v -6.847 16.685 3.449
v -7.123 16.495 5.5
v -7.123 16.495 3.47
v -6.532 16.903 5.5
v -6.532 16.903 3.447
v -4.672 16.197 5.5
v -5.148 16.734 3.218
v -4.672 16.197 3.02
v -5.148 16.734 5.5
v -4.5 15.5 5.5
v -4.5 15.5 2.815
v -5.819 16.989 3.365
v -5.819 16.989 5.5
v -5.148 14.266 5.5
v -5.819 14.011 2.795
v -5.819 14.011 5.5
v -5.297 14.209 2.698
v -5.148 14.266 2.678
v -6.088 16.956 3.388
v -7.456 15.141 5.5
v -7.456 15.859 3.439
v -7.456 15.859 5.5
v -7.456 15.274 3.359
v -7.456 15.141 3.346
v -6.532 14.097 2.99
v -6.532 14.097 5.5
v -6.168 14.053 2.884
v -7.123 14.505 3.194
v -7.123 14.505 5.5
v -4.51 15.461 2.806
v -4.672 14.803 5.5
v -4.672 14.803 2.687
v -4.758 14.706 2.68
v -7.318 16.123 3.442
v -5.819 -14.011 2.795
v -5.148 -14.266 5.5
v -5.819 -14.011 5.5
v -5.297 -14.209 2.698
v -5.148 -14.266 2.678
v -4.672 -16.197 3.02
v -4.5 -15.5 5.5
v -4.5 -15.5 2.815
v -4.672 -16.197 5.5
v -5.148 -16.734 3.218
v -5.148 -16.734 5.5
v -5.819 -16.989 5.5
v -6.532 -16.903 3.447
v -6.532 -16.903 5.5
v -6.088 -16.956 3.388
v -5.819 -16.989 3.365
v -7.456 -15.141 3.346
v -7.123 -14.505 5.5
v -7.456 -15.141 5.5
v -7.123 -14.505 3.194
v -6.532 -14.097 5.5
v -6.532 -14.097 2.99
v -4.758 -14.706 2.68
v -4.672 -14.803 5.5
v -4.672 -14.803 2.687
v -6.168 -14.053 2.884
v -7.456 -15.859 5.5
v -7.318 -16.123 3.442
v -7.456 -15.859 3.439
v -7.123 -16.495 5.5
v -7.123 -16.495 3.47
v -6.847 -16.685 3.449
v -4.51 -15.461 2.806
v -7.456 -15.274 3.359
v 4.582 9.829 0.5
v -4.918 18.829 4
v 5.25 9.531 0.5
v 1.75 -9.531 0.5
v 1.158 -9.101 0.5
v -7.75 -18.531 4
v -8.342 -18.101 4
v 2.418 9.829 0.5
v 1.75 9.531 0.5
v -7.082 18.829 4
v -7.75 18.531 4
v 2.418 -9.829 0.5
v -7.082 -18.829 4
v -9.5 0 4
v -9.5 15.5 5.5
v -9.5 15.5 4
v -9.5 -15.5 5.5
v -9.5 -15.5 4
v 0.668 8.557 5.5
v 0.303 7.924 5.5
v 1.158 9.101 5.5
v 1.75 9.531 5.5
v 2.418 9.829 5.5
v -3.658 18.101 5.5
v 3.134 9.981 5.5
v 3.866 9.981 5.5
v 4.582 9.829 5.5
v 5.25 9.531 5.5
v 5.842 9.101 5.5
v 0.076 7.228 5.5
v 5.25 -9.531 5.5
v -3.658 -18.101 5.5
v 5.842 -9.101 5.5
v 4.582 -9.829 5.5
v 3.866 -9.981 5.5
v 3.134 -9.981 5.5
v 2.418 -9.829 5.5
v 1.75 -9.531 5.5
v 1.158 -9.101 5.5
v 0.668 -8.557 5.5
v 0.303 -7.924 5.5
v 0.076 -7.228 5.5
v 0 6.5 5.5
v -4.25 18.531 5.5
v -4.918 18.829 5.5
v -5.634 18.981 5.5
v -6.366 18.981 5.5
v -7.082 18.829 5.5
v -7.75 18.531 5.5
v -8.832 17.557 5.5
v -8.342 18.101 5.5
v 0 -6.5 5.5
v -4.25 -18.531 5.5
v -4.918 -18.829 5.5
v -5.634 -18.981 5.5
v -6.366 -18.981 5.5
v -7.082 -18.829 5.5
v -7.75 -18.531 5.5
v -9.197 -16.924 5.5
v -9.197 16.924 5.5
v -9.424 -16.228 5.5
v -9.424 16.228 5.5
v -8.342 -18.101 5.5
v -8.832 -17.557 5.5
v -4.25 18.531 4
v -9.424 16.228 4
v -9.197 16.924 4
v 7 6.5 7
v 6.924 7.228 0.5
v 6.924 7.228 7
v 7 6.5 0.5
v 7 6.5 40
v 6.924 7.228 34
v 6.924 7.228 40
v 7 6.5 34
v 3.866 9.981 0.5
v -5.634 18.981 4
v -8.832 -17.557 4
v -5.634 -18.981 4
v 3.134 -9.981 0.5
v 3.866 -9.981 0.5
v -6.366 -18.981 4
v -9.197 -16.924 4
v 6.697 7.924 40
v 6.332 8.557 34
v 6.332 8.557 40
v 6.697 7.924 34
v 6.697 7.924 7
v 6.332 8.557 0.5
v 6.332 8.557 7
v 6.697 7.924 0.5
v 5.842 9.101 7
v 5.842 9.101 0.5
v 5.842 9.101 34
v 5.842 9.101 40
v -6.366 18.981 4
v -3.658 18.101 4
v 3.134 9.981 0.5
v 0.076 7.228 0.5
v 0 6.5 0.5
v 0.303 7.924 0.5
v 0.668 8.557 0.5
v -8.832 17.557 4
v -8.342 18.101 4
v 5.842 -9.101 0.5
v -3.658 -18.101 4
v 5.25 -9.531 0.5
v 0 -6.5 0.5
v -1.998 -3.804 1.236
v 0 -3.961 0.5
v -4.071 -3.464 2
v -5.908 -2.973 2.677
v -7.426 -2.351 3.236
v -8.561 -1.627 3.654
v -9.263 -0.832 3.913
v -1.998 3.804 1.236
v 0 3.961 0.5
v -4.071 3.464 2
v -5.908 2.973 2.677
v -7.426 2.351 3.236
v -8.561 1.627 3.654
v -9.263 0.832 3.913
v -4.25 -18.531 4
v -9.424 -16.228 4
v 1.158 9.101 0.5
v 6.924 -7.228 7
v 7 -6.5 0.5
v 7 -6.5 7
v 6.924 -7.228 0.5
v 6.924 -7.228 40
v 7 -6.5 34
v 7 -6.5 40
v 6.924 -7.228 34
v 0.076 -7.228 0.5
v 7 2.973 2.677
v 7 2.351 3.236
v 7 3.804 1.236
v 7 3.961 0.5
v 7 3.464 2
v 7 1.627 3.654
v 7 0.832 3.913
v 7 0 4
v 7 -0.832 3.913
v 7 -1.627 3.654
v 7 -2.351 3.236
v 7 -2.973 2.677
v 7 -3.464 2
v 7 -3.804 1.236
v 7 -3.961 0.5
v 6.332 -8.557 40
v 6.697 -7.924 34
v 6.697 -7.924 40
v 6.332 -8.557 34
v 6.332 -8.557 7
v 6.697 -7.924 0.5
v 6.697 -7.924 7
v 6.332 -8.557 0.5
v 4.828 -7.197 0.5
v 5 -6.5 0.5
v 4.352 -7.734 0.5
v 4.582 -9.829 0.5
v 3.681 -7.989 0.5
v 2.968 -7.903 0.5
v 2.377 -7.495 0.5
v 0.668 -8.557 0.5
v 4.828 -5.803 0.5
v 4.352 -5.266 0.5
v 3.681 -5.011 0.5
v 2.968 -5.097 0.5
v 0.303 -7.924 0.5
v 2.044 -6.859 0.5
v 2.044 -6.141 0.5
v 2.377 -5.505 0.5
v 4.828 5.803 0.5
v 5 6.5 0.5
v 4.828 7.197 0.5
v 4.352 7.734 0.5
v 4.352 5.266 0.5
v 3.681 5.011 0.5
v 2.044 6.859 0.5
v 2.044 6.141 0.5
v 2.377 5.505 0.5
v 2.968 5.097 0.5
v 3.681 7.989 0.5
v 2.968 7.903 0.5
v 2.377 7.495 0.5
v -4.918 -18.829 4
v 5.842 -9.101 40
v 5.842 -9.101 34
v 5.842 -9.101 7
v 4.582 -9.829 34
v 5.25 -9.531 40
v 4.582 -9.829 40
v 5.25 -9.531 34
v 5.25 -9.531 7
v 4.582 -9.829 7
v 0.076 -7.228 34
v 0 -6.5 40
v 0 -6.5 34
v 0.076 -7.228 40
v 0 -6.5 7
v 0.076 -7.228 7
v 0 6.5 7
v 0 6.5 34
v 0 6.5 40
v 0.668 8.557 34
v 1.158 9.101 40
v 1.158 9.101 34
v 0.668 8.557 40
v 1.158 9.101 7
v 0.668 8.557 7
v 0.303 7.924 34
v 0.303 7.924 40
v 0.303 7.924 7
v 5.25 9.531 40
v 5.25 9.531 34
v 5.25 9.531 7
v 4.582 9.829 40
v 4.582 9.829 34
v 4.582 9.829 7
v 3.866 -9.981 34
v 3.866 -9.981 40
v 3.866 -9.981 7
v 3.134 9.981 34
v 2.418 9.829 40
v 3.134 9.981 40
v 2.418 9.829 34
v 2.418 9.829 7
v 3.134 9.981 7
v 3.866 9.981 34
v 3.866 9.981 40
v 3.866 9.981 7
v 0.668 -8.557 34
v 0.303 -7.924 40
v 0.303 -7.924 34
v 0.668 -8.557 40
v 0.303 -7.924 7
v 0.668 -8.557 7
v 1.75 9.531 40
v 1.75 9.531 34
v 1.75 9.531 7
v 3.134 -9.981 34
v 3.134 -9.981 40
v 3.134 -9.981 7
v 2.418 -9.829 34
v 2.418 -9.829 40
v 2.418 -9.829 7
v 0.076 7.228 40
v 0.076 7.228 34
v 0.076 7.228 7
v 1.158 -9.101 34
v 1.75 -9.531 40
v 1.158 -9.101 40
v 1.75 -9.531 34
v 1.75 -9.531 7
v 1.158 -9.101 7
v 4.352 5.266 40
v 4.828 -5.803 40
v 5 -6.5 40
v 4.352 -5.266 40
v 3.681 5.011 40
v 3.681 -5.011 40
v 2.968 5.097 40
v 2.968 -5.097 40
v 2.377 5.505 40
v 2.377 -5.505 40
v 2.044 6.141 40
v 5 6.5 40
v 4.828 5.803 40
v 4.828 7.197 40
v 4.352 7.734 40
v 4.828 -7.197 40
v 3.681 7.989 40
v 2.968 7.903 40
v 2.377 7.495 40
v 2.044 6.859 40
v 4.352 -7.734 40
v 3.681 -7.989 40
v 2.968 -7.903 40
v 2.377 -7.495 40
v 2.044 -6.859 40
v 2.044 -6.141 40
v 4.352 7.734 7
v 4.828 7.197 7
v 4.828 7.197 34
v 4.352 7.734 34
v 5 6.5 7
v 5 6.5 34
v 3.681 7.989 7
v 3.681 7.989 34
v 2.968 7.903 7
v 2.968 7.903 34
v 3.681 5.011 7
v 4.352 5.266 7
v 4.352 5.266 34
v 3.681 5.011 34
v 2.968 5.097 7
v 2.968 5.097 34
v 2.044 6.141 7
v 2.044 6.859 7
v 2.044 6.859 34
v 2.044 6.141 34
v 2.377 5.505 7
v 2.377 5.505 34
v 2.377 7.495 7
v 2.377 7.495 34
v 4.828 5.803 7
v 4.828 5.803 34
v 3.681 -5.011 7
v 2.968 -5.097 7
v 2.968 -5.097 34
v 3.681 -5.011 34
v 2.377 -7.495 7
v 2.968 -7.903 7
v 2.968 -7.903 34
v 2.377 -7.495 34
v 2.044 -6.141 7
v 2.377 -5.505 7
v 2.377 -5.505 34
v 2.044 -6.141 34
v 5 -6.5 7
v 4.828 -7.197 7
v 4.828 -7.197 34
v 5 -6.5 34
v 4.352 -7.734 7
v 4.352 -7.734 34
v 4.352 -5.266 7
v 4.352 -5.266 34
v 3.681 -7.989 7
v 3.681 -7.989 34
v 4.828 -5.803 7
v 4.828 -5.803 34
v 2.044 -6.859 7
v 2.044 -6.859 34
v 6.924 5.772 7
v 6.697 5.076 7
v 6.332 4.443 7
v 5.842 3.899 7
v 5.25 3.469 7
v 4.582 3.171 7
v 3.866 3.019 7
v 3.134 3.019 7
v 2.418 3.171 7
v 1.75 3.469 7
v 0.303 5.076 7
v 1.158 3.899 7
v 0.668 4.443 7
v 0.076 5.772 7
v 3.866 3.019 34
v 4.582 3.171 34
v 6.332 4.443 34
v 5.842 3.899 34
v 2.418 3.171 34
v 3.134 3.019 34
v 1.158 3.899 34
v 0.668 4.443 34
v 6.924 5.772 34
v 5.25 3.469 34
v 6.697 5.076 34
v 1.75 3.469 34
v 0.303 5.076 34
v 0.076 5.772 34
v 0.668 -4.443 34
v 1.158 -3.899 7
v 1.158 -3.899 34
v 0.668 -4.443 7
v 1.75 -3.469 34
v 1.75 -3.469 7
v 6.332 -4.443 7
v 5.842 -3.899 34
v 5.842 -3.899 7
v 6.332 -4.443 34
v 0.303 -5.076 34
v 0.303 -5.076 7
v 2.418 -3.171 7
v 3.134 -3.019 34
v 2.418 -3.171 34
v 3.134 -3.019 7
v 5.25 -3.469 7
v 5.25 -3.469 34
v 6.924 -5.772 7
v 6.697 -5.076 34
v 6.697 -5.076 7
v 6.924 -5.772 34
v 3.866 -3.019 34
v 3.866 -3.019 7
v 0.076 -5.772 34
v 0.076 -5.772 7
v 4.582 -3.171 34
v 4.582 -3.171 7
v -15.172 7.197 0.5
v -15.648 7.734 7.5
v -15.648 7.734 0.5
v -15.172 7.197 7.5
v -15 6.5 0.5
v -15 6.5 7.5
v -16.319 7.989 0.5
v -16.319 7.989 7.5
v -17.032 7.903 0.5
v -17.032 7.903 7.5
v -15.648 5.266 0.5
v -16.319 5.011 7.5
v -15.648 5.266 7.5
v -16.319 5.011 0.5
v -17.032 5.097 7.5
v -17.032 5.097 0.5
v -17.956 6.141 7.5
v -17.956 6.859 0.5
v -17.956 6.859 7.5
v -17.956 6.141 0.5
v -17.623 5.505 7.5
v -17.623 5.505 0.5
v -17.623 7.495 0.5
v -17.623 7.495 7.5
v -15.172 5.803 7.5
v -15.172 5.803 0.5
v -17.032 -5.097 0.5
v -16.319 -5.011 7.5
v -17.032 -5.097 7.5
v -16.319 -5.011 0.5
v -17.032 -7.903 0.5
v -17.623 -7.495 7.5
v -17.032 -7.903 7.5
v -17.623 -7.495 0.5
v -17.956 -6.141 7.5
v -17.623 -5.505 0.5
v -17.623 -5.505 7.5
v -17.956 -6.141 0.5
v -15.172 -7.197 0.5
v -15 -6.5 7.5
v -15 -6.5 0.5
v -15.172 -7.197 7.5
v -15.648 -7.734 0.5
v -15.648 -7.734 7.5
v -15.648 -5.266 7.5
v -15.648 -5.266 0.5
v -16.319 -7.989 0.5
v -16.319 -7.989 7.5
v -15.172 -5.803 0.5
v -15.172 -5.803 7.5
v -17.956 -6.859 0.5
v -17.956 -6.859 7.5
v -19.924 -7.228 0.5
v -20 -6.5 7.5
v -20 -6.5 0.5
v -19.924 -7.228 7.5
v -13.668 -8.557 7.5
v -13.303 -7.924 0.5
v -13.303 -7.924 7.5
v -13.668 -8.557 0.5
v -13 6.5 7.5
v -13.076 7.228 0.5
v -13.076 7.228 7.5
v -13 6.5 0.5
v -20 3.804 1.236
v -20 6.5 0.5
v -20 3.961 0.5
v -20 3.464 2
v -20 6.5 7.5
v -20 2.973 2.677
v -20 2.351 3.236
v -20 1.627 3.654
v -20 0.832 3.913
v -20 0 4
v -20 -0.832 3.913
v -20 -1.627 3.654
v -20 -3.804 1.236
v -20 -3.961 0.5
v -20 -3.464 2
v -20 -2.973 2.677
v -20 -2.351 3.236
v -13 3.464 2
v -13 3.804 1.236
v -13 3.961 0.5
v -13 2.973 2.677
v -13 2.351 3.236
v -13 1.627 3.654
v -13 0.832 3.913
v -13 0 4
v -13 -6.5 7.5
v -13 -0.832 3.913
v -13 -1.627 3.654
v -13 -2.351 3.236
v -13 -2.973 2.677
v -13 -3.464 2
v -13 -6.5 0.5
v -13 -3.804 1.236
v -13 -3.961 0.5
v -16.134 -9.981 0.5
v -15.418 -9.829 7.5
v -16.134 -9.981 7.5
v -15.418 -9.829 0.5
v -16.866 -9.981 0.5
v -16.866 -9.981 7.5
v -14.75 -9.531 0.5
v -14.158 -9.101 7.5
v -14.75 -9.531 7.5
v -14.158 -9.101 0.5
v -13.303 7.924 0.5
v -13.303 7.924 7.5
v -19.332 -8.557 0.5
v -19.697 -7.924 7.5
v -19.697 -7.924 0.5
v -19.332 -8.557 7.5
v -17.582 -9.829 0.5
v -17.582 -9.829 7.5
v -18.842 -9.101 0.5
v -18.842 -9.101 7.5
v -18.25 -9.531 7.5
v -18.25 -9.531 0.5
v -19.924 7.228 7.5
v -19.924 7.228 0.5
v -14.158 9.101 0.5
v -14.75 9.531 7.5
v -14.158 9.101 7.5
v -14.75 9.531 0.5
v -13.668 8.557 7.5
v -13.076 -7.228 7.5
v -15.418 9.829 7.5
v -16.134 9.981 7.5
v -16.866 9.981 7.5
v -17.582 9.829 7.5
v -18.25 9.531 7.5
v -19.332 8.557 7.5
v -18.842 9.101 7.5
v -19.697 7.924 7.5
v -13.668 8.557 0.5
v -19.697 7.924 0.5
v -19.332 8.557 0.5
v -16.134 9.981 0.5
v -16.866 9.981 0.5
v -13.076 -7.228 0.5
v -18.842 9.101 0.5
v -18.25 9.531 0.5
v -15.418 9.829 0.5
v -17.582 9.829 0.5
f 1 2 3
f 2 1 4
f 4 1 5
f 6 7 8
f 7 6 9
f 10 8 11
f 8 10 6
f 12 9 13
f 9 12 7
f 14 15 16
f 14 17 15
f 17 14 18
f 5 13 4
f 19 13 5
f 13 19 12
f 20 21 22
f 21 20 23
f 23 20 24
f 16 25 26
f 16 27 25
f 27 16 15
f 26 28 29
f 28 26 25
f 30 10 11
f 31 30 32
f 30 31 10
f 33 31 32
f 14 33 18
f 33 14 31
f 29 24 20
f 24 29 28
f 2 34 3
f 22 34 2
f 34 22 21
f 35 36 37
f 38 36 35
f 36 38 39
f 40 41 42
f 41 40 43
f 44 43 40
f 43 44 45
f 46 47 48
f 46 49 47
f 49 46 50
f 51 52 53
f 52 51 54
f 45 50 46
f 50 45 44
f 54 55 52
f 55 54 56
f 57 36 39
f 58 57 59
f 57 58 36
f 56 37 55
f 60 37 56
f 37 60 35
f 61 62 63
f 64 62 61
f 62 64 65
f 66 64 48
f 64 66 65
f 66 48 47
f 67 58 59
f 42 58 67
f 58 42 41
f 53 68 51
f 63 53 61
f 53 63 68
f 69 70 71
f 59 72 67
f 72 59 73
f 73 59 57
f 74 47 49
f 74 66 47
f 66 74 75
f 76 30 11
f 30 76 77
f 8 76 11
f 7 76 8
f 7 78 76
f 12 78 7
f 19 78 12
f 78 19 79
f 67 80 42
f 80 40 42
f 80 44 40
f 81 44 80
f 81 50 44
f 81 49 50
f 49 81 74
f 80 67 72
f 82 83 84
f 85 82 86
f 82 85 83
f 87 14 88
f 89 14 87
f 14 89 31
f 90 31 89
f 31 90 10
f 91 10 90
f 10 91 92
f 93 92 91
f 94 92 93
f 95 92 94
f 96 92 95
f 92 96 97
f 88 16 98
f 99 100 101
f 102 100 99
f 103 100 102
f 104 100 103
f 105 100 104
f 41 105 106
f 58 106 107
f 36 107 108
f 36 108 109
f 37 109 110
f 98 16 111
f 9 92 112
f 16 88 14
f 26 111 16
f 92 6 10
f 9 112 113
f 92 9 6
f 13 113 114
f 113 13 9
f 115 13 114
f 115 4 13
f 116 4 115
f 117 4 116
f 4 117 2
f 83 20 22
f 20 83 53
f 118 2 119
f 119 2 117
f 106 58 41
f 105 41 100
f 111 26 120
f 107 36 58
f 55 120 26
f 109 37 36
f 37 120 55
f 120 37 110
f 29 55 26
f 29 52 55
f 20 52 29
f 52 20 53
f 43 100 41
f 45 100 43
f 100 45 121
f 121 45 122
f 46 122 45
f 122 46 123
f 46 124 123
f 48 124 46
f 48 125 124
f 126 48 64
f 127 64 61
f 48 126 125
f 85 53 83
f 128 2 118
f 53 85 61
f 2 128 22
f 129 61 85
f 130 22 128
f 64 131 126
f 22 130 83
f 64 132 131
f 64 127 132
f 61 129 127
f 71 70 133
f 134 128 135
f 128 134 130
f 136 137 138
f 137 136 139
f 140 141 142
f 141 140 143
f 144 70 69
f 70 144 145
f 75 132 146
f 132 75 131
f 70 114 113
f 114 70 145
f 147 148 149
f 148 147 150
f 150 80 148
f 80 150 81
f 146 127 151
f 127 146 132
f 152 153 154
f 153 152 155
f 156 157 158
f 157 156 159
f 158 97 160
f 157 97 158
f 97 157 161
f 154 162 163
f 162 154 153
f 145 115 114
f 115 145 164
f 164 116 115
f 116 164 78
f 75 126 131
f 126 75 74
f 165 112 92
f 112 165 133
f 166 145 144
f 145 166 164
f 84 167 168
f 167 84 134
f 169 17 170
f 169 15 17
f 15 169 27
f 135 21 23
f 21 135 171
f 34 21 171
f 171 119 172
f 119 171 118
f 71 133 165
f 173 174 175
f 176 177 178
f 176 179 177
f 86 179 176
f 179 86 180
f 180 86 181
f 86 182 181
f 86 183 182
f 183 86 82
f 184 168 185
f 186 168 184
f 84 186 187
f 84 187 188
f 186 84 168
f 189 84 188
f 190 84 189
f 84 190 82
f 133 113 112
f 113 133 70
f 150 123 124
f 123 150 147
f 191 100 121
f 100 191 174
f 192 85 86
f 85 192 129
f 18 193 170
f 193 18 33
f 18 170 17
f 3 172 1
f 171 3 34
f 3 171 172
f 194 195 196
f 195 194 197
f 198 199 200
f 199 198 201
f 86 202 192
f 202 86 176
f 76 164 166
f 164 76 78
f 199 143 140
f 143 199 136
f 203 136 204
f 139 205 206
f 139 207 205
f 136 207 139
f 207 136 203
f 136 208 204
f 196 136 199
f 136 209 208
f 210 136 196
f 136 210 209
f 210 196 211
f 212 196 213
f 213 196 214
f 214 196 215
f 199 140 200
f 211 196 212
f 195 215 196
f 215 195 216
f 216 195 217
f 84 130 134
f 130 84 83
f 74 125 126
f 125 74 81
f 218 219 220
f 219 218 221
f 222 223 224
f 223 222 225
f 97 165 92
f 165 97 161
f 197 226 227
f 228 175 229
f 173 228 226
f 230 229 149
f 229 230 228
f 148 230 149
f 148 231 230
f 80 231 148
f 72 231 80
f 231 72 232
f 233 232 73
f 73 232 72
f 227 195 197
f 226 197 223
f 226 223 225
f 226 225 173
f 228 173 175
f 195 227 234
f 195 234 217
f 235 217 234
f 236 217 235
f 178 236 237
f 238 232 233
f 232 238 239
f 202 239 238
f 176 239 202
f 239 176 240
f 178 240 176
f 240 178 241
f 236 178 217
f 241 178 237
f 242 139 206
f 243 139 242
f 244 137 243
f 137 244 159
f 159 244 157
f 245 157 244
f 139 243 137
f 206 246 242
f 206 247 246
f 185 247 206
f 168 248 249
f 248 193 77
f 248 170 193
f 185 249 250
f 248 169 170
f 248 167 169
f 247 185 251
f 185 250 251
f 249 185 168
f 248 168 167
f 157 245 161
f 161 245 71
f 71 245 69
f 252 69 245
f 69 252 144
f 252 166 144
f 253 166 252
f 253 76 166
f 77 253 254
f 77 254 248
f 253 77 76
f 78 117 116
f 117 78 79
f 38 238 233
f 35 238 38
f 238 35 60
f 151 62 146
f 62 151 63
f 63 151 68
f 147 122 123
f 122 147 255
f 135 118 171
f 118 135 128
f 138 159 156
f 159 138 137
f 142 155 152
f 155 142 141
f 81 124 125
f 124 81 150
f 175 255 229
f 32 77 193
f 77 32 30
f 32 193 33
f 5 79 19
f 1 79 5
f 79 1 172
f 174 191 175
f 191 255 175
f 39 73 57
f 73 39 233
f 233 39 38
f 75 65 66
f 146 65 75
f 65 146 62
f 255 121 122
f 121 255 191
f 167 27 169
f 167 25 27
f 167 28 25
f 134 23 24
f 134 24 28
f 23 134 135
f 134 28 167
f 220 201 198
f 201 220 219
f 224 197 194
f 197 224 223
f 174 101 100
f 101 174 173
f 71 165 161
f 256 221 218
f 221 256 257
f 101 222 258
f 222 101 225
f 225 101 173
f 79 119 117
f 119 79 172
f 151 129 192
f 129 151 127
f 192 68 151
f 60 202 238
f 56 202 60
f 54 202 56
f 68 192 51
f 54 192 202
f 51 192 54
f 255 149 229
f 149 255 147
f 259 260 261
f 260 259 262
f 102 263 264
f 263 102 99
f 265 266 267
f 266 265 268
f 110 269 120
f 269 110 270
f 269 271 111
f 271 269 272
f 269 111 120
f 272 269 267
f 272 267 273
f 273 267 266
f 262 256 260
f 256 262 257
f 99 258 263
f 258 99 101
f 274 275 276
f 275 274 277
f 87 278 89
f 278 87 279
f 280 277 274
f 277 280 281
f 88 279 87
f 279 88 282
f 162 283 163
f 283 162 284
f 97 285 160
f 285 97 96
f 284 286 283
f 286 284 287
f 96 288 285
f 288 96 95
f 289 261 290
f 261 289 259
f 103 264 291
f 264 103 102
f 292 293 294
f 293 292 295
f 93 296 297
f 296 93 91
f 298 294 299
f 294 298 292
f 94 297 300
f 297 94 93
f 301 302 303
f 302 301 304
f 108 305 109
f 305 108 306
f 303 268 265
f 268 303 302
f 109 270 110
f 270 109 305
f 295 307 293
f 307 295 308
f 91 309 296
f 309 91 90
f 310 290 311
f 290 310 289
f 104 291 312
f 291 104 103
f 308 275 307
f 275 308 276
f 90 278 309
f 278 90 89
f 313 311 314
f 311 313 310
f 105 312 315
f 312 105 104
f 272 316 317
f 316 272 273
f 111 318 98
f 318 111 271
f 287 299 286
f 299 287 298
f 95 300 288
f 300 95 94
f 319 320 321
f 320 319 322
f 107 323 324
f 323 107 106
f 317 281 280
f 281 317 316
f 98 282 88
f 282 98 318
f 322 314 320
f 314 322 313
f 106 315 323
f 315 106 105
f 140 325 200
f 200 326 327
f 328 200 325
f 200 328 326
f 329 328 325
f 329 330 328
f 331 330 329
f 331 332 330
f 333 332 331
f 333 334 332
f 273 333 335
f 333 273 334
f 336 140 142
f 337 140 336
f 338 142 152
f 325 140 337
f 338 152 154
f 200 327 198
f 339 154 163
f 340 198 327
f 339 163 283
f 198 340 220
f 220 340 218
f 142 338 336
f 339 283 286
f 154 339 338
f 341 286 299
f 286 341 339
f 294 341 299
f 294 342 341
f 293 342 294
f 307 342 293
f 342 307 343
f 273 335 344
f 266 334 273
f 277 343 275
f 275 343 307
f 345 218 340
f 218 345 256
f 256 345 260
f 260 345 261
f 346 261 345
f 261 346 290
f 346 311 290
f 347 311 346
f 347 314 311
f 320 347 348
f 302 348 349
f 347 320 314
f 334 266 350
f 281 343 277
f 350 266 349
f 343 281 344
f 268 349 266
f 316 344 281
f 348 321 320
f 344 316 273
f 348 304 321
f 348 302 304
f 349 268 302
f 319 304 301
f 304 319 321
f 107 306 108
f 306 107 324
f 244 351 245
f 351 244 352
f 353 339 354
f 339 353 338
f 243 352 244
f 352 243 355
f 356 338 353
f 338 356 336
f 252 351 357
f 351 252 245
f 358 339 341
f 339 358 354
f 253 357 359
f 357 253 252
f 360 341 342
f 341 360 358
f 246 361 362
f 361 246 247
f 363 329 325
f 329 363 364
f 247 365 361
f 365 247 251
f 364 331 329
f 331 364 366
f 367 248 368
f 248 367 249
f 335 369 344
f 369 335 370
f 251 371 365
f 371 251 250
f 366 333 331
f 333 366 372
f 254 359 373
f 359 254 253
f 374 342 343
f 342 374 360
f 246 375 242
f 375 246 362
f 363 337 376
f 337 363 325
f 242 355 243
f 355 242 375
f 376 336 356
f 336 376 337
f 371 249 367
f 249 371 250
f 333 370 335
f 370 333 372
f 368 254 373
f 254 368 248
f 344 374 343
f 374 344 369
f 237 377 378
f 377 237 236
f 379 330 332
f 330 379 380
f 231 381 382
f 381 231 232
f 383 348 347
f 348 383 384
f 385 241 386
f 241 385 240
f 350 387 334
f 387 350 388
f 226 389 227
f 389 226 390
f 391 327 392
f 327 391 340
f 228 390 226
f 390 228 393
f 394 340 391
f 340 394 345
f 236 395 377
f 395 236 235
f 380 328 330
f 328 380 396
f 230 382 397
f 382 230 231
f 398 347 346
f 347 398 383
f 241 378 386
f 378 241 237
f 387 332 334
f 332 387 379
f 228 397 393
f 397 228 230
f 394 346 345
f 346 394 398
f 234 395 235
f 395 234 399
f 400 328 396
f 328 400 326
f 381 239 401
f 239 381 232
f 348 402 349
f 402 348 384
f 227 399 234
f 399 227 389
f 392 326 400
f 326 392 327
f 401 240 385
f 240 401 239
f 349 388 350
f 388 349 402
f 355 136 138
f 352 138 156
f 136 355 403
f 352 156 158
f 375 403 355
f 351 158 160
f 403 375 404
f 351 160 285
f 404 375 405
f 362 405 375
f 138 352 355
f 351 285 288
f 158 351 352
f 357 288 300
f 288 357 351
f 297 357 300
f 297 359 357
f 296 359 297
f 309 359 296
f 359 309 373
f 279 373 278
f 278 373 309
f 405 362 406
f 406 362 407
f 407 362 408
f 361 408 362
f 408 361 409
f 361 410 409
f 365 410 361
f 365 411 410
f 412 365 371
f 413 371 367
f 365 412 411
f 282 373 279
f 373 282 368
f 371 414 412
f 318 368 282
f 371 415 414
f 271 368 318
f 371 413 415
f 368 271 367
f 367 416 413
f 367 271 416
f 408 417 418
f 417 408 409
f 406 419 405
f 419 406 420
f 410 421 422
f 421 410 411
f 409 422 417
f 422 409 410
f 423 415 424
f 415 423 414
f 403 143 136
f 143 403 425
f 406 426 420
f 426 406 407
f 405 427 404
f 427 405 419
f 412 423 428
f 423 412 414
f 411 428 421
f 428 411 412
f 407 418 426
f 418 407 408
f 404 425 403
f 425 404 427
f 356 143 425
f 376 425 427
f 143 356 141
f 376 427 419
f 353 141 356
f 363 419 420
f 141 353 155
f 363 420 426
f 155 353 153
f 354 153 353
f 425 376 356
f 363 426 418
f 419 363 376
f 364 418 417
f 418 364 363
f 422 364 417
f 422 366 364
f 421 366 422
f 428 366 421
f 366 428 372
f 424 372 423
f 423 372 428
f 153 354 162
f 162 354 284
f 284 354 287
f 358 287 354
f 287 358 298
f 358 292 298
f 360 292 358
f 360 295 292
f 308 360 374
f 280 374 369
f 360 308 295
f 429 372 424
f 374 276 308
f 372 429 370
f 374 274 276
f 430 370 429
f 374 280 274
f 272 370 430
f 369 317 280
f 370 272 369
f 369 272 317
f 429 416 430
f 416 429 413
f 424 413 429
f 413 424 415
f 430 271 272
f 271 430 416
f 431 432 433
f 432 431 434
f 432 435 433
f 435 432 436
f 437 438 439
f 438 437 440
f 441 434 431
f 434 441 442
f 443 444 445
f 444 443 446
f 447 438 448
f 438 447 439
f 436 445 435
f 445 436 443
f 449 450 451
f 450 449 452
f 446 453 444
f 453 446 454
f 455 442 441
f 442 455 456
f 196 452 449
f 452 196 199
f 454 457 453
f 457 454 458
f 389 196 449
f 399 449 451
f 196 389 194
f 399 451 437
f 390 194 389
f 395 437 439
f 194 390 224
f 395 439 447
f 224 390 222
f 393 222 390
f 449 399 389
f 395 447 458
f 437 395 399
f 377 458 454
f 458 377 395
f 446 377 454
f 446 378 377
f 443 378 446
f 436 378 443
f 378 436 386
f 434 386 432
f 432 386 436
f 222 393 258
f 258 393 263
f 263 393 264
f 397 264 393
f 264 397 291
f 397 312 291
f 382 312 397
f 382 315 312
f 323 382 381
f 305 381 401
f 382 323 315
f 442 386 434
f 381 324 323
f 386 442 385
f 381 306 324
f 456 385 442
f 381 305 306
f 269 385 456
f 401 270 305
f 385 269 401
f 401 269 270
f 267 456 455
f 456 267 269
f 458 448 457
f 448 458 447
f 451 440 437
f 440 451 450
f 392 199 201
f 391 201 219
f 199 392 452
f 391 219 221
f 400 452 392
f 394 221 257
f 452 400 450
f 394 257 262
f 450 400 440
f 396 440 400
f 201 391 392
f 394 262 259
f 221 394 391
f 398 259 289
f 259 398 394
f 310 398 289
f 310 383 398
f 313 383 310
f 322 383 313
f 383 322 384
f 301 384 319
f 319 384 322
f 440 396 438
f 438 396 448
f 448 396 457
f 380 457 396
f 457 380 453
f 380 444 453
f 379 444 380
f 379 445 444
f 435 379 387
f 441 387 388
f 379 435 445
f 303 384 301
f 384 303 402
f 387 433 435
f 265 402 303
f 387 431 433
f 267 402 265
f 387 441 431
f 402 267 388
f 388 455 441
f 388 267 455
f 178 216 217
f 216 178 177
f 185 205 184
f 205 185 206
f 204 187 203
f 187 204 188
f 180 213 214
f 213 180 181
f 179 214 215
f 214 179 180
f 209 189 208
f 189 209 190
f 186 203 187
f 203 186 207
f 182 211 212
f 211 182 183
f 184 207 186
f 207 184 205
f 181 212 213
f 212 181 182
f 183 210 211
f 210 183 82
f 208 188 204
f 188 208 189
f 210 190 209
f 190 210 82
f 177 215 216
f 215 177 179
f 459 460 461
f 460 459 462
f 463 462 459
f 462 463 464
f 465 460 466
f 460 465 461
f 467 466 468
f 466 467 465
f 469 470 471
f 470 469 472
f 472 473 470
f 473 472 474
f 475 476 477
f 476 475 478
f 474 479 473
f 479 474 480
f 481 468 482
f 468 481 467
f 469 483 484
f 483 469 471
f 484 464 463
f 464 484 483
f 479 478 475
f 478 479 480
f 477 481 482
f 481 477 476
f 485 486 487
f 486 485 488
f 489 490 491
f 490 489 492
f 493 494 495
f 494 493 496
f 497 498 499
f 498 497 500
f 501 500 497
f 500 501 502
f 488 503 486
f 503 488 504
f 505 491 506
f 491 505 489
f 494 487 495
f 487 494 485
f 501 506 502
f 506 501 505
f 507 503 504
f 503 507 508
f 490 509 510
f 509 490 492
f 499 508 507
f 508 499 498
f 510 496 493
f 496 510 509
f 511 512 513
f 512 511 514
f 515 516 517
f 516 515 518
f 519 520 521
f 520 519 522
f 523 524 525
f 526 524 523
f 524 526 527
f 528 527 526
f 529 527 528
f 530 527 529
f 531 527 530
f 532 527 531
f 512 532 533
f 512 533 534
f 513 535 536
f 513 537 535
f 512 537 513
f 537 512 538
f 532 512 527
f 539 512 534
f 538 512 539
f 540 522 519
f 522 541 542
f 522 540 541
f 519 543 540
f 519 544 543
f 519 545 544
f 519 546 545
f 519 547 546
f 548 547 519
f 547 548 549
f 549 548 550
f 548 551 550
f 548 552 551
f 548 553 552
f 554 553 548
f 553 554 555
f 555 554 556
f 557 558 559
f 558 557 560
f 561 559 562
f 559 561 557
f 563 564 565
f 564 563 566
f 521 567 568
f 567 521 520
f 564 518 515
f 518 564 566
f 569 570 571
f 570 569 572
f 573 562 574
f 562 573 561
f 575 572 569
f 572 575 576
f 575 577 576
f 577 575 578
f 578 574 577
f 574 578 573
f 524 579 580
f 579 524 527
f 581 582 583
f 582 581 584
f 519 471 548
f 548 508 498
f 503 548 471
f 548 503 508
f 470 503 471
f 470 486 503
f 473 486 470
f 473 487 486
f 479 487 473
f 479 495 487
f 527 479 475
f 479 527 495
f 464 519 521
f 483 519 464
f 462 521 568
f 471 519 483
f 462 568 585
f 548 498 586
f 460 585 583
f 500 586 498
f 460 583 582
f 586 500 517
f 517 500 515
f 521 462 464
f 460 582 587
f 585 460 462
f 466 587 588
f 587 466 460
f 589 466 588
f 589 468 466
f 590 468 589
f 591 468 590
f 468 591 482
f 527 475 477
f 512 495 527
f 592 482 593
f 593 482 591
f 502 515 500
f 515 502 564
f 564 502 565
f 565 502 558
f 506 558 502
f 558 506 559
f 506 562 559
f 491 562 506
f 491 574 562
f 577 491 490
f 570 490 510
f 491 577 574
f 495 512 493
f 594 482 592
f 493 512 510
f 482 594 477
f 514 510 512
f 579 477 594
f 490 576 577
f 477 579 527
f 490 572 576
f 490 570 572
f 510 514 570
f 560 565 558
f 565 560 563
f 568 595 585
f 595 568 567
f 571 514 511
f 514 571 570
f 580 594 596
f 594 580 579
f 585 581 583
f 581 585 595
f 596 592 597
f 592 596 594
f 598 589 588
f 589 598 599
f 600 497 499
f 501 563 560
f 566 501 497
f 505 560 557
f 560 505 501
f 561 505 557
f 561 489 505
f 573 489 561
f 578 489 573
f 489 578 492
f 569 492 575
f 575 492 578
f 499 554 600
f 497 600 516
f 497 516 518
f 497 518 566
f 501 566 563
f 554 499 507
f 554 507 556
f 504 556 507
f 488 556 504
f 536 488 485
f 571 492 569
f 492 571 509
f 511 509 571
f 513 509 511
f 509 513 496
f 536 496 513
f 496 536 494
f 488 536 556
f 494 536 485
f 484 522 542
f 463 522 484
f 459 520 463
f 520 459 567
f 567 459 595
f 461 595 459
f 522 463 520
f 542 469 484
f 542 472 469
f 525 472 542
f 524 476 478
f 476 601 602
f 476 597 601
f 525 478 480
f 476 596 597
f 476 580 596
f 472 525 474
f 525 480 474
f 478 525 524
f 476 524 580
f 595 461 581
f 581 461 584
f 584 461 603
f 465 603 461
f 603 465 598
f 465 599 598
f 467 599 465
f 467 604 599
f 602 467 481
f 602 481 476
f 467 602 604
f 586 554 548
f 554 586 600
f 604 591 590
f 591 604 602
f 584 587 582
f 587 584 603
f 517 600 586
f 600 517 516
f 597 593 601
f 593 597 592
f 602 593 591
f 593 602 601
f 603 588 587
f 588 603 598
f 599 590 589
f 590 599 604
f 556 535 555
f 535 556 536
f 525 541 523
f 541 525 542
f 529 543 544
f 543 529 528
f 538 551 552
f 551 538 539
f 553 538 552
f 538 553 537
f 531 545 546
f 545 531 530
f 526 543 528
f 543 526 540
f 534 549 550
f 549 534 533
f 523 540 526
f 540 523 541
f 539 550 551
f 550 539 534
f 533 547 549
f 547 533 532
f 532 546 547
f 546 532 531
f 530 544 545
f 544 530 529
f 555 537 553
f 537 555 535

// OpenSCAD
$fs=.75;

union() {
	difference() {
		union() {
			translate(v = [3.5000000000, 0, 0.5000000000]) {
				hull() {
					union() {
						translate(v = [0, 6.5000000000, 0]) {
							cylinder(d = 7, h = 39.5000000000);
						}
						mirror(v = [0, 1, 0]) {
							translate(v = [0, 6.5000000000, 0]) {
								cylinder(d = 7, h = 39.5000000000);
							}
						}
					}
				}
			}
			difference() {
				hull() {
					union() {
						translate(v = [-6.0000000000, 15.5000000000, 4.0000000000]) {
							cylinder(d = 7, h = 1.5000000000);
						}
						mirror(v = [0, 1, 0]) {
							translate(v = [-6.0000000000, 15.5000000000, 4.0000000000]) {
								cylinder(d = 7, h = 1.5000000000);
							}
						}
						translate(v = [3.5000000000, 0, 0.5000000000]) {
							union() {
								translate(v = [0, 6.5000000000, 0]) {
									cylinder(d = 7, h = 5.0000000000);
								}
								mirror(v = [0, 1, 0]) {
									translate(v = [0, 6.5000000000, 0]) {
										cylinder(d = 7, h = 5.0000000000);
									}
								}
							}
						}
					}
				}
				union() {
					translate(v = [-6.0000000000, 15.5000000000, 0]) {
						cylinder(d = 3, h = 10);
					}
					mirror(v = [0, 1, 0]) {
						translate(v = [-6.0000000000, 15.5000000000, 0]) {
							cylinder(d = 3, h = 10);
						}
					}
				}
			}
		}
		translate(v = [-10, 0, 0]) {
			rotate(a = [0, 90, 0]) {
				cylinder(d = 8.0000000000, h = 20);
			}
		}
		union() {
			translate(v = [3.5000000000, 6.5000000000, 0]) {
				translate(v = [0, 0, -50.0000000000]) {
					cylinder(d = 3, h = 100);
				}
			}
			mirror(v = [0, 1, 0]) {
				translate(v = [3.5000000000, 6.5000000000, 0]) {
					translate(v = [0, 0, -50.0000000000]) {
						cylinder(d = 3, h = 100);
					}
				}
			}
		}
		translate(v = [0, 0, 7]) {
			union() {
				translate(v = [3.5000000000, 6.5000000000, 0]) {
					cylinder(d = 7, h = 27.0000000000);
				}
				mirror(v = [0, 1, 0]) {
					translate(v = [3.5000000000, 6.5000000000, 0]) {
						cylinder(d = 7, h = 27.0000000000);
					}
				}
			}
		}
	}
	translate(v = [-20, 0, 0]) {
		difference() {
			translate(v = [3.5000000000, 0, 0.5000000000]) {
				hull() {
					union() {
						translate(v = [0, 6.5000000000, 0]) {
							cylinder(d = 7, h = 7);
						}
						mirror(v = [0, 1, 0]) {
							translate(v = [0, 6.5000000000, 0]) {
								cylinder(d = 7, h = 7);
							}
						}
					}
				}
			}
			translate(v = [-10, 0, 0]) {
				rotate(a = [0, 90, 0]) {
					cylinder(d = 8.0000000000, h = 20);
				}
			}
			union() {
				translate(v = [3.5000000000, 6.5000000000, 0]) {
					translate(v = [0, 0, -50.0000000000]) {
						cylinder(d = 3, h = 100);
					}
				}
				mirror(v = [0, 1, 0]) {
					translate(v = [3.5000000000, 6.5000000000, 0]) {
						translate(v = [0, 0, -50.0000000000]) {
							cylinder(d = 3, h = 100);
						}
					}
				}
			}
		}
	}
}
/***********************************************
*********      SolidPython code:      **********
************************************************
 
from solid import *
from solid import extensions

class Object:
    pass


rod=Object()
rod.d=8.0

nema17 = Object()
nema17.side = 43.
nema17.holeDistance = 31.0
nema17.screwD= 3.
nema17.height = 34. #47 for the long ones, 34 for the short ones


bearing = Object()
bearing.outD = 15.0
bearing.length = 24.0

# to place the rod supports on top of the nema17
supportDepth=10
xRodHole = cylinder(d=rod.d, h=20).rot(y=90)
xSupport = ( cube([supportDepth,nema17.side,rod.d/2+1]).align('left','bottom')
             - xRodHole.move(z=-.5)
             - cylinder(d=nema17.screwD,h=12).center().move(x=5,y=nema17.holeDistance/2.).mirrorCopy('y')
           ).rot(x=180)


bearingShape = cylinder(d=bearing.outD, h= bearing.length+1).center()

#minimal y cart, z motor will be placed in between the rails
yRodDistance = 60.0 # rounding up from nema17.side + bearing.outD
wall=2.0
cartWidth = 2*bearing.length
yBearings = bearingShape.move(z=bearing.length/2).mirrorCopy('z').move(x=yRodDistance/2).mirrorCopy('x')
yCart = ( ( cylinder(d= bearing.outD + 2*wall, h= cartWidth).center().rot(x=90).move(x=yRodDistance/2).mirrorCopy('x')
          + cube([yRodDistance, cartWidth, bearing.outD/2+wall]).align('bottom').move(z=-bearing.outD/2-wall)
          + cube([yRodDistance+bearing.outD+2*wall, cartWidth, bearing.outD/2+wall]).align('top').move(z=bearing.outD/2+wall)

          ) - yBearings.rot(x=90)
            - cube([nema17.side, cartWidth, bearing.outD/2-3]).align('top')
            - cube([nema17.side, cartWidth, bearing.outD]).align('bottom')
            - cube([yRodDistance+20, cartWidth, 3]).align('bottom').move(z=-bearing.outD/2-wall)
            - cylinder(d=3,h=10).move([nema17.holeDistance/2, nema17.holeDistance/2, -bearing.outD/2]).mirrorCopy('x').mirrorCopy('y').debug()
            - cylinder(d=nema17.holeDistance, h =10).move(z=-bearing.outD/2)
          )



#supports for holding the y rods in from the x bearings
bearingCover = cylinder(d= bearing.outD + 2*wall, h= bearing.length).center().rot(y=90)
baseBlock = hull( bearingCover
                  + cube([bearing.outD+2,10,bearing.outD+2]).align('back').move(y=bearing.outD/2+wall))
capScrews = cylinder(d=3., h=bearing.outD + 2*wall).center().move(x=rod.d/2+3./2+1,y=12).mirrorCopy('x')
rodHole = cylinder(d=rod.d,h=10).rot(x=-90).move(y=bearing.outD/2+wall)
#capTopBase = cube([bearing.length, 11, bearing.outD]).center('x').move(y=bearing.outD/2+wall)
#capTopBase = polygon([[0,0],[0,10],[10,10],[10,-3]]).linear_extrude(bearing.length,True).rot(y=-90).move(y=bearing.outD/2+wall)
capTopBase = cube([bearing.length, 20, bearing.outD]).center('x')-bearingCover

baseSupport = baseBlock - rodHole - capScrews

ySupport = part(cylinder(d= bearing.outD + 2*wall, h= yRodDistance + bearing.length).center().rot(y=90)
                 - hole(cylinder(d= bearing.outD, h= yRodDistance + bearing.length).center().rot(y=90))
                 + ( baseSupport
                     * cube(50).align('top')
                   ).move(x=yRodDistance/2).mirrorCopy('x')
                 - cube(1000).align('top').move(z=-bearing.outD/2+1)
                 )

ySupportRodCap = ( baseSupport
                * capTopBase
                - cube([bearing.length,50,1]).align('bottom')
                - cube([bearing.length,10,10]).center('xy')
                )

#support for z rods placed on the falt surface of the yCart above the bearings
zRodDistance = 31.
rodSupport = (cylinder(d=rod.d + 3, h=6) - cylinder(d=rod.d, h=6+1)).move(y=zRodDistance / 2)
beltGuide = ( cube([bearing.outD, bearing.length-zRodDistance/2, 6]).center('x')
              - cylinder(d=rod.d + 6,h=6+1)
              - cube([1,20,6+1]).center('x')).move(y=zRodDistance/2)
zSupport = ( cube([bearing.outD,2*bearing.length,wall]).center('xy')
             + rodSupport.move(z=wall).mirrorCopy('y')
             + beltGuide.move(z=wall).mirrorCopy('y')
           )

zstepper = cube([nema17.side,nema17.side,34]).center('xy').move(z=-bearing.outD/2).color('gray')


yCartZSupport = yCart + zSupport.move(x=yRodDistance/2 ,z=bearing.outD/2)


def xTailBase(h):
    return hull([cylinder(d=3+4,h=h).move(x= 4, y=3./2+rod.d/2+1).mirrorCopy('y'),
                 cylinder(d=4+6, h=h).move(x=-3)
                ]).move(z=.5)

capScrewHoles = cylinder(d=3,h=100).center().move(x= 4, y=3./2+rod.d/2+1).mirrorCopy('y')
pulleyScrewHole = cylinder(d=4,h=100).center().move(x= -3)
nutCuts = (cylinder(d=3+4,h=nema17.height-7).move(x= 4, y=3./2+rod.d/2+1).mirrorCopy('y')
          + cylinder(d=4+6, h=nema17.height-7).move(x=-3)).move(z=7)
xTailSupport = ( xTailBase(nema17.height+1.5+rod.d/2.)
                 - xRodHole
                 - capScrewHoles
                 - pulleyScrewHole
                 - nutCuts
               )
xTailCap = ( xTailBase(7)
             - xRodHole
             - capScrewHoles
             - pulleyScrewHole
            )

def xFrontBase(h):
    return hull([cylinder(d=3+4,h=h).move(y=3./2+rod.d/2+1).mirrorCopy('y'),
                ]).move(x=3.5,z=.5)

capScrewHoles = cylinder(d=3,h=100).center().move(x=3.5,y=3./2+rod.d/2+1).mirrorCopy('y')
nutCuts = (cylinder(d=3+4,h=nema17.height-7).move(x=3.5,y=3./2+rod.d/2+1).mirrorCopy('y')
          ).move(z=7)
xSupportH=nema17.height+1.5+rod.d/2.
nemaSupport = ( hull(cylinder(d=3+4,h=1.5).move(x=-(nema17.side-nema17.holeDistance)/2,y=nema17.holeDistance/2,z=xSupportH-1.5-nema17.height).mirrorCopy('y')
                     + cylinder(d=3+4,h=xSupportH-nema17.height-.5).move(y=3./2+rod.d/2+1).mirrorCopy('y').move(x=3.5,z=.5)
                    )
                - cylinder(d=3,h=10).move(x=-(nema17.side-nema17.holeDistance)/2,y=nema17.holeDistance/2).mirrorCopy('y'))
xFrontSupport = ( xFrontBase(xSupportH)
                 + nemaSupport
                 - xRodHole.move(x=-10)
                 - capScrewHoles
                 - nutCuts
               )
xFrontCap = ( xFrontBase(7)
             - xRodHole.move(x=-10)
             - capScrewHoles
            )


zTopH=5.
zBearingD = 16.
zTopBase = hull(cylinder(d=rod.d+6,h=zTopH).move(y=zRodDistance/2).mirrorCopy('y')
            +cylinder(d=zBearingD+6,h=zTopH).move(x=-yRodDistance/2))
zHoles =  (cylinder(d=rod.d,h=zTopH).move(y=zRodDistance/2).mirrorCopy('y')
           + cylinder(d=zBearingD,h=zTopH).move(x=-yRodDistance/2))
zTop = zTopBase - zHoles




zNutD0 = 10.
zNutD1 = 22.
zNutH0 = 10.
drillD = 36.

base = ( hull(cylinder(d=bearing.outD+6,h=bearing.length).move(y=zRodDistance/2).mirrorCopy('y')
              + cylinder(d=zNutD1+2,h=bearing.length).move(x=-yRodDistance/2)
              + cylinder(d=drillD+6,h=bearing.length).move(x=drillD/2+5)
              + cube([.1,25,zNutH0]).center('y').move(x=drillD+5)
              )
            + cube([8,25,zNutH0]).center('y').move(x=drillD+5)
        )

holes =  (cylinder(d=bearing.outD, h=bearing.length).move(y=zRodDistance/2).mirrorCopy('y')
           + cylinder(d=zNutD0+1,h=bearing.length).move(x=-yRodDistance/2)
           + cylinder(d=drillD,h=bearing.length).move(x=drillD/2+5)
           + cube([20,2,zNutH0]).center('xy').move(x=drillD+7)
           + cylinder(d=3,h=30).center().rot(x=90).move(x=drillD+9,z=zNutH0/2).debug()
           )

zNutDrills = cylinder(d=3,h=bearing.length).move(x=17./2).rot(z=45).mirrorCopy('y').mirrorCopy('x').move(x=-yRodDistance/2)

def ushape(p,f=.5):
    return (cylinder(d=100.*f,h=100.).center().rot(x=90)-cube([500.*f,100,100]).center('yz')
            +cube([50.*(1-f),100.,100.*f]).center('yz')

           ).move(x=(.5-f)*-50).resize(p)

pD=[40,60,30]
pN=[35,60,30]
profileCuts = (ushape(pD,.5).move(x=pD[0]/2+bearing.outD/2,z=pD[2]/2+zNutH0)+
           ushape(pN,.4).mirror('x').move(x=-pN[0]/2-bearing.outD/2,z=pN[2]/2+zNutH0)
          )

sideCuts = cube([100,20,bearing.length]).center('x').move(y=zRodDistance/2+bearing.outD/2-1).mirrorCopy('y')

zDrillCart_ = base - holes - zNutDrills  - profileCuts

zDrillCart = zDrillCart_.copy() #- sideCuts
zDrillCart0 = zDrillCart_.copy().intersection(cube([60,60,bearing.length]).center('y').move(x=-bearing.outD/2+1))

scene = xFrontSupport +xFrontCap.move(x=-20)


'''
scene = ( xSupport.move(x=-100)
          + ySupport + ySupportRodCap.move(x=-yRodDistance / 2, z=3)
          + (yCartZSupport ).move(y=50)
        )
'''
scad_render_to_file(scene, 'routerParts.scad', '$fs=.75;')

#scad_render_to_file(xSupport, 'routerParts_xSupport.scad', '$fs=.75;')
#scad_render_to_file(ySupport, 'routerParts_ySupport.scad', '$fs=.75;')
#scad_render_to_file(ySupportRodCap, 'routerParts_ySupportCap.scad', '$fs=.75;')
#scad_render_to_file(yCartZSupport, 'routerParts_yCart.scad', '$fs=.75;')
#scad_render_to_file( xTailSupport.rot(y=90), 'routerParts_xTailSupport.scad', '$fs=.75;')
#scad_render_to_file( xTailCap.rot(y=90), 'routerParts_xTailCap.scad', '$fs=.75;')
scad_render_to_file( xFrontSupport.rot(y=90), 'routerParts_xFrontSupport.scad', '$fs=.75;')
scad_render_to_file( xFrontCap.rot(y=90), 'routerParts_xFrontCap.scad', '$fs=.75;')
#scad_render_to_file( zTop, 'routerParts_zTop.scad', '$fs=.75;')
#scad_render_to_file( zDrillCart, 'routerParts_zDrillCart.scad', '$fs=.75;')
#scad_render_to_file( zDrillCart0, 'routerParts_zDrillCart0.scad', '$fs=.75;')
 
 
************************************************/
